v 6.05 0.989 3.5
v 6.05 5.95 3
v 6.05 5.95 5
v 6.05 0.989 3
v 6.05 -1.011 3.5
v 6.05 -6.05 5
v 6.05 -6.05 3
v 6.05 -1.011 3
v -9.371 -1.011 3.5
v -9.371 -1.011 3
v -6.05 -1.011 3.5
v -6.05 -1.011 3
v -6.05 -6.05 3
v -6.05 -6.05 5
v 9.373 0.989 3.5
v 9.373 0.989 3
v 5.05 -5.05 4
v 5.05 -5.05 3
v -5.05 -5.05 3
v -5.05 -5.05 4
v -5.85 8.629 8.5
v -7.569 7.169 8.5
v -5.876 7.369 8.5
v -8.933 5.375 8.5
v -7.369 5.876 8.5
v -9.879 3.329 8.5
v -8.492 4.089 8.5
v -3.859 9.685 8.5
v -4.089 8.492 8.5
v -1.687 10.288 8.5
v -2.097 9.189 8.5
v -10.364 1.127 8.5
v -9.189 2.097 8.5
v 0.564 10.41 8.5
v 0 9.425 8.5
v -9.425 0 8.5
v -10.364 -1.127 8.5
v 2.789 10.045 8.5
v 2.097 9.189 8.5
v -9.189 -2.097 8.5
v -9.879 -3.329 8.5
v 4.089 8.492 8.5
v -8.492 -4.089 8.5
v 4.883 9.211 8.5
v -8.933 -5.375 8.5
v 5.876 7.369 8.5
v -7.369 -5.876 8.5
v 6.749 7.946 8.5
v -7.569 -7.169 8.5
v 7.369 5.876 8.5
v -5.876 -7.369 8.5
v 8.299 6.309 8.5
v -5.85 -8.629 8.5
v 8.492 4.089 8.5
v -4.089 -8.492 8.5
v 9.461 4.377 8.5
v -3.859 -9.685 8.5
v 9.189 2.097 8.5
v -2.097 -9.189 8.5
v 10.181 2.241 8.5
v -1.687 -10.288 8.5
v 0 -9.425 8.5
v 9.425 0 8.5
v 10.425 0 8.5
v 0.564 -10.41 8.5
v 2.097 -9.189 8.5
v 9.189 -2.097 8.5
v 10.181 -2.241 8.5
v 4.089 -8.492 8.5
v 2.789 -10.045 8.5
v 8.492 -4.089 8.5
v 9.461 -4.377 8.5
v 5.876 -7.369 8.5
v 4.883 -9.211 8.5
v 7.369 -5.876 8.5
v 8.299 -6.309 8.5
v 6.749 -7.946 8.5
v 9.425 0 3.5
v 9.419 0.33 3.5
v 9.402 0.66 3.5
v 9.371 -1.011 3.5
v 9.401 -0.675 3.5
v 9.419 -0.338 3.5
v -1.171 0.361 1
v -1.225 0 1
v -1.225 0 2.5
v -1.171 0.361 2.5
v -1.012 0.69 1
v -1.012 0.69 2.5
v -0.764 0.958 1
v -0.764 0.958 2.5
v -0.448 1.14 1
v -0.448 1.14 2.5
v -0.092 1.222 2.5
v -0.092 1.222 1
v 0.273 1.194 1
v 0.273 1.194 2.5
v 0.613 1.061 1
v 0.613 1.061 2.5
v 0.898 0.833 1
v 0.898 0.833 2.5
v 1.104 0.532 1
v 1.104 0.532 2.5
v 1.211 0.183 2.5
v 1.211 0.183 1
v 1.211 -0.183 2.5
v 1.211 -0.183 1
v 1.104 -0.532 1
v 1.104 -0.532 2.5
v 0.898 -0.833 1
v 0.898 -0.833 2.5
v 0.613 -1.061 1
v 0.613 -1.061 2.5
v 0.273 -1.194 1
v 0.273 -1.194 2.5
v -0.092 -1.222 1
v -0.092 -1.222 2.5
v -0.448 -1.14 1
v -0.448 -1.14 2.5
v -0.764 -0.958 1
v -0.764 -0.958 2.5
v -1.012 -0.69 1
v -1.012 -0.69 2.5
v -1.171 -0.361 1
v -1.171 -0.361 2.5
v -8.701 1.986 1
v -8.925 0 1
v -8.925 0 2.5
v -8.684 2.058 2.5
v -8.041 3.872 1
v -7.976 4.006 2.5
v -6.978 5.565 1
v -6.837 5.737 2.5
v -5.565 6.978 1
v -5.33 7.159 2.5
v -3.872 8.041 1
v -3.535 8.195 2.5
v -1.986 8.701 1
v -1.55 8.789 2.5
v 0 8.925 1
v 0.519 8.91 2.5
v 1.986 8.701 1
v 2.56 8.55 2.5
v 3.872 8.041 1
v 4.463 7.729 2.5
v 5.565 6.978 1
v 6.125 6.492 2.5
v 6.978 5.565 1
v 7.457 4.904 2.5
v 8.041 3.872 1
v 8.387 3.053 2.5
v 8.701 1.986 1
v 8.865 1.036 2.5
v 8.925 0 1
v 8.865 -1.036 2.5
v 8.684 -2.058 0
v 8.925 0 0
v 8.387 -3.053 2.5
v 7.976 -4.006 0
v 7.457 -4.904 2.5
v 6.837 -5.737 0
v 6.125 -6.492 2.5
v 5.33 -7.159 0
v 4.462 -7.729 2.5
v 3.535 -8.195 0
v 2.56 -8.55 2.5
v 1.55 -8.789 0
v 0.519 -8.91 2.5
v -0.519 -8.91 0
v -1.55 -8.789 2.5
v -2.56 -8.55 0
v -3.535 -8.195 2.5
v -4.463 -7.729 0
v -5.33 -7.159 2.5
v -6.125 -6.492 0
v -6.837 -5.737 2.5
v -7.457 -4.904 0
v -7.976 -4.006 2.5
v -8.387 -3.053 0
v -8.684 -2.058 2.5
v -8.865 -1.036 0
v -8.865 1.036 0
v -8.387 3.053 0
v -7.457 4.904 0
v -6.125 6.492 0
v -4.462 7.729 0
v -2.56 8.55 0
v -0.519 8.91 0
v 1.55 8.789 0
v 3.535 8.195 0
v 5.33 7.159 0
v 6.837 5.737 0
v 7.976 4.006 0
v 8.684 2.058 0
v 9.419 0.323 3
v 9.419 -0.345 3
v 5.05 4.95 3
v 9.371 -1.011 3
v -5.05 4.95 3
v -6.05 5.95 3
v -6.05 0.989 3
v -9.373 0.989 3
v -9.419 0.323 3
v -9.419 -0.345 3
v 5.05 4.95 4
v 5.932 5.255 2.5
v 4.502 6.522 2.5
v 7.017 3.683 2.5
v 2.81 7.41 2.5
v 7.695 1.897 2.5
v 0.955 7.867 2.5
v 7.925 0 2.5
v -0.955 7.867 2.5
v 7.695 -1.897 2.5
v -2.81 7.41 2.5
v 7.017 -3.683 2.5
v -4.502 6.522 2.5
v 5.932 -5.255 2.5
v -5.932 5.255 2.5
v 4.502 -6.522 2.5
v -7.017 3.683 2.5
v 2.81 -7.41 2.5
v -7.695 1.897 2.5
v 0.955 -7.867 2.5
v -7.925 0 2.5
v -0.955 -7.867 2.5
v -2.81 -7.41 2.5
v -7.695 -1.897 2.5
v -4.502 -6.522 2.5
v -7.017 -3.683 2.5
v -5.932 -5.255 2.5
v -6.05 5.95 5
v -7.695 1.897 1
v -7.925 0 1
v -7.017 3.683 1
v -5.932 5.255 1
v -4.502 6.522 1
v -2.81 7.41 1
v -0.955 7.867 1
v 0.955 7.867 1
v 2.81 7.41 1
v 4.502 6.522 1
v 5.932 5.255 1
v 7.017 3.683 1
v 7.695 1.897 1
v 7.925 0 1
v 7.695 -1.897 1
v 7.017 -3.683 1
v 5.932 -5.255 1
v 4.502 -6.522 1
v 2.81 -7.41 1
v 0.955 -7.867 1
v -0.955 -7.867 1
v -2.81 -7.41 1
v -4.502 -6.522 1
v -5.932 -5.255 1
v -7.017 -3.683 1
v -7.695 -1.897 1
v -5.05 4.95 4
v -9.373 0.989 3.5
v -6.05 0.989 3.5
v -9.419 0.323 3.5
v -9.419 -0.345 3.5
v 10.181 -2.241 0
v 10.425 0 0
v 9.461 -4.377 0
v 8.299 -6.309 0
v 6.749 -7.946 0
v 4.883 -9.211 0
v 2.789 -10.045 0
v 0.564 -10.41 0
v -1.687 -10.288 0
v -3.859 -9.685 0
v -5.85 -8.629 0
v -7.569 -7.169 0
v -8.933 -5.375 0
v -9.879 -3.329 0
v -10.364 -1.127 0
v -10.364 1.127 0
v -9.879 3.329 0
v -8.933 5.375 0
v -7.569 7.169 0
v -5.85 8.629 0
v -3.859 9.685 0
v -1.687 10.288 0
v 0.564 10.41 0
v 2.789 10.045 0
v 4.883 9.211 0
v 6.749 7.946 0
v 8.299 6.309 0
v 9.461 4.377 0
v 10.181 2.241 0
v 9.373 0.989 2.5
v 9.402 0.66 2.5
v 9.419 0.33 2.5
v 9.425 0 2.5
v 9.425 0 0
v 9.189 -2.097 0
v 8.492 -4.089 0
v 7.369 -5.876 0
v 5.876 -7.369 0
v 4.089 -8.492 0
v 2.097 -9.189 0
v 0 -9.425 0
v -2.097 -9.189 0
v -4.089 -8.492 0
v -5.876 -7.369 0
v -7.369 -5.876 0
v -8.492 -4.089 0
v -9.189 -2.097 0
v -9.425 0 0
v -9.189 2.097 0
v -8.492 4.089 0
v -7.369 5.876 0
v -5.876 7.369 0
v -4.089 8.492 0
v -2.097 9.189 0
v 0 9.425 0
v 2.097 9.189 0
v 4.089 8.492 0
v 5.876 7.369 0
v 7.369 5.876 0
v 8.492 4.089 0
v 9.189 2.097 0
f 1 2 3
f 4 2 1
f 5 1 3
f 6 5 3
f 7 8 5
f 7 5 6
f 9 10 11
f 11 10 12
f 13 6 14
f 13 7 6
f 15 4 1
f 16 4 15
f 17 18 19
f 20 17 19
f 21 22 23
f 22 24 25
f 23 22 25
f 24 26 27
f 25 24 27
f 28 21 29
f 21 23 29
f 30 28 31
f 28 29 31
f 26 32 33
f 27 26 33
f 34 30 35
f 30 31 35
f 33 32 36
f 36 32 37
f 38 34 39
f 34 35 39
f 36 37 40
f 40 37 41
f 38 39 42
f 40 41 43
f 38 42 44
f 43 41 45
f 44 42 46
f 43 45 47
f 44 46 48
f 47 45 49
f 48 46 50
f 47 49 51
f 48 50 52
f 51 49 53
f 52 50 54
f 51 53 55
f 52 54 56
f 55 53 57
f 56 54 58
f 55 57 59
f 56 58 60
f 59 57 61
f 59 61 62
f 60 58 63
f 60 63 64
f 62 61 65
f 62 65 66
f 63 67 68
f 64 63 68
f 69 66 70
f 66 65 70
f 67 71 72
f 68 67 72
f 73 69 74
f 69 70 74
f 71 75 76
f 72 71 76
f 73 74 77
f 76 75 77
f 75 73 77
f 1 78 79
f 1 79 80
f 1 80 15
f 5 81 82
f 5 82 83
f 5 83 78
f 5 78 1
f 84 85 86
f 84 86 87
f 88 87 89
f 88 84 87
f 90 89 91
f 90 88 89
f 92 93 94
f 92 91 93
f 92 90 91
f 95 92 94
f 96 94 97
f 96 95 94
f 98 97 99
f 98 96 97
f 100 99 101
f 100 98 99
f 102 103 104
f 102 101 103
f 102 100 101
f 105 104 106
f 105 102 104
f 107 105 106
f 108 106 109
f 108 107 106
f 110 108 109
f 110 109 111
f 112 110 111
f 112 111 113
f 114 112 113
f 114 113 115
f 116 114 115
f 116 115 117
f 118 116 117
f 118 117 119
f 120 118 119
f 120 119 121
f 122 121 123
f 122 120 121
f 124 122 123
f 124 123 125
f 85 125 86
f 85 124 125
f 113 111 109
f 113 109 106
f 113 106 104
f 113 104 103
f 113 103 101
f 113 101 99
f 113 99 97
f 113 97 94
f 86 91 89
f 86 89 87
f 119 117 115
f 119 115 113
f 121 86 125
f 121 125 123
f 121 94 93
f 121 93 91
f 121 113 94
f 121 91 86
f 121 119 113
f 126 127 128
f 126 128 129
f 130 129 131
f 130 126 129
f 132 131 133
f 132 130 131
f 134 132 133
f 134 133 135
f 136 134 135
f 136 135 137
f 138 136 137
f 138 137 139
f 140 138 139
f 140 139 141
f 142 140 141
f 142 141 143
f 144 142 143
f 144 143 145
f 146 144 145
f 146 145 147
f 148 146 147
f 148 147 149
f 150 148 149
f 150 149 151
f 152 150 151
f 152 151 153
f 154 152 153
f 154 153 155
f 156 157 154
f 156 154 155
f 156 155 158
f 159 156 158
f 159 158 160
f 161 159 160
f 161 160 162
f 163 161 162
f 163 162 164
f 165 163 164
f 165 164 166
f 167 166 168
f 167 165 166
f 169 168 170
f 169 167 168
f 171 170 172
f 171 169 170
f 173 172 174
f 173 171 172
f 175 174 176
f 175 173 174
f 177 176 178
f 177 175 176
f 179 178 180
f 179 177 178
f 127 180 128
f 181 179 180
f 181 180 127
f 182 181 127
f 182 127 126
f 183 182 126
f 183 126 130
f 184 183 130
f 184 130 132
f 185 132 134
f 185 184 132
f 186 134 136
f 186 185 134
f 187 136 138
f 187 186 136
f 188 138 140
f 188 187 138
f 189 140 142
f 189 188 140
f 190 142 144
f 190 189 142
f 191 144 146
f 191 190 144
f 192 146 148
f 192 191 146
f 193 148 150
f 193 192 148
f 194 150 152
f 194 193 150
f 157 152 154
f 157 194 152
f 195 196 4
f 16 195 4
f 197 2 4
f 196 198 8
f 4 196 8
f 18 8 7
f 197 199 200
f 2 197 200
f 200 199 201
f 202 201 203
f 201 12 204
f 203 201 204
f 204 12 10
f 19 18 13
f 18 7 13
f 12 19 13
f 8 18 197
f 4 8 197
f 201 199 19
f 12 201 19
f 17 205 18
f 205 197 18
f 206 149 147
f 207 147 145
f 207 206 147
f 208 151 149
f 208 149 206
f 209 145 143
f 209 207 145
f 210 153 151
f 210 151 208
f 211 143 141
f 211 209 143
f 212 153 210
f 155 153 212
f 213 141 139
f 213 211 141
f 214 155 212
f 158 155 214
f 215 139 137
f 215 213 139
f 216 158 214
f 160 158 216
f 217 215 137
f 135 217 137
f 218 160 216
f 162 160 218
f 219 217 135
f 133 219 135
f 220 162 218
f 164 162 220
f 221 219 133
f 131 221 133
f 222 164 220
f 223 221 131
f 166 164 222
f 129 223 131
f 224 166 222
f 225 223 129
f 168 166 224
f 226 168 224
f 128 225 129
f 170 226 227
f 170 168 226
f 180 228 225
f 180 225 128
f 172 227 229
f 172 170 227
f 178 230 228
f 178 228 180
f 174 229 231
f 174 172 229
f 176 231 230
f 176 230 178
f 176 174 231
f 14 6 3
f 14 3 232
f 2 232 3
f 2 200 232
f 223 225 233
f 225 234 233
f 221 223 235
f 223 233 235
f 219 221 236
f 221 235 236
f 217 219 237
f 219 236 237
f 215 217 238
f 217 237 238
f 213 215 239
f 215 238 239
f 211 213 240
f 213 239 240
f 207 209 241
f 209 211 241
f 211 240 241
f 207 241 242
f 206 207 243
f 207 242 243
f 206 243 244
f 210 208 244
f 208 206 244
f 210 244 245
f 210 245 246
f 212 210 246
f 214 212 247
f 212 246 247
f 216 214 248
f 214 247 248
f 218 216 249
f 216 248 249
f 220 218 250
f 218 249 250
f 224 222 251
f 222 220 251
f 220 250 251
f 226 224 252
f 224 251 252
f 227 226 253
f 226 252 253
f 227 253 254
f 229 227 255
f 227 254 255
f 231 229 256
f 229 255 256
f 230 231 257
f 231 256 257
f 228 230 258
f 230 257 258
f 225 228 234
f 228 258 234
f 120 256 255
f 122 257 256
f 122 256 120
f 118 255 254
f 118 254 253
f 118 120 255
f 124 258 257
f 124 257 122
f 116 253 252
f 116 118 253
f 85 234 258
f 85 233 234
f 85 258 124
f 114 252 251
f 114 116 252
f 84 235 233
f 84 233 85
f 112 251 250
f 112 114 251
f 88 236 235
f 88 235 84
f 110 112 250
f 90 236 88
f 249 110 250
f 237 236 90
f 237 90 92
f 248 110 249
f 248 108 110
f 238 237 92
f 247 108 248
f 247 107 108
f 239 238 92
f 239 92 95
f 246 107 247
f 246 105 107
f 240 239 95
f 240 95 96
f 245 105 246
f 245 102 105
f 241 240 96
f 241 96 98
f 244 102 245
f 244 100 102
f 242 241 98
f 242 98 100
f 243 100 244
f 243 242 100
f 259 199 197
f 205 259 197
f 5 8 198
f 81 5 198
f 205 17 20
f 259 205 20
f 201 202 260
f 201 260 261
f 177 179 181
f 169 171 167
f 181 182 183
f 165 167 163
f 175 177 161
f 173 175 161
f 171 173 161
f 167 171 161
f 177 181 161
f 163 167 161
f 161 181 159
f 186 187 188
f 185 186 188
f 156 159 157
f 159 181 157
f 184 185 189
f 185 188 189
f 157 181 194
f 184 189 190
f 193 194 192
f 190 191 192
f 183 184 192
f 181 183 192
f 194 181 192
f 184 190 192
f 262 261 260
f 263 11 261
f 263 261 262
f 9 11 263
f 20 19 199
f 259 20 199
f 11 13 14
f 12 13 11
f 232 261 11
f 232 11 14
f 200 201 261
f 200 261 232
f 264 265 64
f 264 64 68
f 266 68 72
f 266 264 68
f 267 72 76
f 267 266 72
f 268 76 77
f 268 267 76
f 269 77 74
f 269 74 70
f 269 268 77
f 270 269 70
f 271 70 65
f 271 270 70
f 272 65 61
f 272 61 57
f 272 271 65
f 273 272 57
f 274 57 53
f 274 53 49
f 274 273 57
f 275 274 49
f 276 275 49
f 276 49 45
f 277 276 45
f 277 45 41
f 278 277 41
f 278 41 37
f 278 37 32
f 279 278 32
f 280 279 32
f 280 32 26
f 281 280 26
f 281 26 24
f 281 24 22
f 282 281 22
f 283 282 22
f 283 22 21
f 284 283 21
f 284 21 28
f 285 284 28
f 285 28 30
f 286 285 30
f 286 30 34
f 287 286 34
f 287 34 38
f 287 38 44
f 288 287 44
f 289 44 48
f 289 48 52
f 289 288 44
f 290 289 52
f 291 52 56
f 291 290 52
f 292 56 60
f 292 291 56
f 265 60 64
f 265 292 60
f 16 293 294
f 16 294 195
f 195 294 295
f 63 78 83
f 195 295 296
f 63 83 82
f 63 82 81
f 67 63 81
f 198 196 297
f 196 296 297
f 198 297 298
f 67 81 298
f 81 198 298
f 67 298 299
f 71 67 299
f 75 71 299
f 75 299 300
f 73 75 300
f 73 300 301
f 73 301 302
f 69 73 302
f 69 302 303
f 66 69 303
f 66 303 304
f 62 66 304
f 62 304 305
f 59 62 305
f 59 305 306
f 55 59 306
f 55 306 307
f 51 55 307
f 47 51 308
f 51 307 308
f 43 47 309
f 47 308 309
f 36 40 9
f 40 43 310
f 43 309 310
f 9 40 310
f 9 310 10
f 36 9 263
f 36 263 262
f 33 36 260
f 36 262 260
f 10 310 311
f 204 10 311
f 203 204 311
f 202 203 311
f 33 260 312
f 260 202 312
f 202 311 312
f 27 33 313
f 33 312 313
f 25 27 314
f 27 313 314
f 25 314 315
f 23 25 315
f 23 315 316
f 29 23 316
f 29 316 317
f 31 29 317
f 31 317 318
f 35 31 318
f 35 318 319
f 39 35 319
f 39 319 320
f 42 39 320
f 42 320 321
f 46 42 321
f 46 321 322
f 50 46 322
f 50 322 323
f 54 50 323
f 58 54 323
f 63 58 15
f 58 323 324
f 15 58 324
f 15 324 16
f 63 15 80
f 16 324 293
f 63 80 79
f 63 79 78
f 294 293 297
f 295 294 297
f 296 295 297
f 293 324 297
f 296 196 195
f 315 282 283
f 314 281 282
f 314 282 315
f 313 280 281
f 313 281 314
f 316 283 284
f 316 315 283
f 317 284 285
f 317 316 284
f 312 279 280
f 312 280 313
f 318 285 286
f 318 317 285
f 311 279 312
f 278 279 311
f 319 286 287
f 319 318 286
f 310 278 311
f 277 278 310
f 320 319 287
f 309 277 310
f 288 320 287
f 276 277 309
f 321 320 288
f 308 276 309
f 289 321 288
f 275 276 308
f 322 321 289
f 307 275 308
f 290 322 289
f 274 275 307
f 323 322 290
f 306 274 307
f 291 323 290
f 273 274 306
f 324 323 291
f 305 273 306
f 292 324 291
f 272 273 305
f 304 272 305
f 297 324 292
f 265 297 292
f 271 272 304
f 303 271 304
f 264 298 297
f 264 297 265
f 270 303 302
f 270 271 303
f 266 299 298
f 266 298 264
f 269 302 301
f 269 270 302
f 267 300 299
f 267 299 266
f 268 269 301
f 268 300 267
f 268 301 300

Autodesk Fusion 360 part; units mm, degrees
sketch "Sketch1" plane through (0, 0, 0) normal (0, 0, 1) x (1, 0, 0)
  circle A0 centre (0, 0) radius 7.925
  circle A1 centre (0, 0) radius 8.925
  dimension "d1" = 15.85
  dimension "d4" = 1
extrude "Extrude1" add sketch "Sketch1" along normal blind 1 contours A0 | A1 makes body 1
sketch "Sketch2" plane through (0, 0, 1) normal (0, 0, 1) x (-1, 0, 0)
  circle A0 centre (0, 0) radius 8.925
  circle A1 centre (0, 0) radius 7.925
  circle A2 centre (0, 0) radius 1.225
  dimension "d5" = 2.45
extrude "Extrude2" add sketch "Sketch2" along normal blind 1.5 bodies 1
sketch "Sketch1 (2)" plane through (0, 0, 0) normal (0, 0, -1) x (1, 0, 0) in component "Charger Bottom"
  circle A0 centre (0, 0) radius 8.925
  circle A1 centre (0, 0) radius 8.925
  circle A2 centre (0, 0) radius 9.425
  circle A3 centre (0, 0) radius 10.425
  dimension "d8" = 0.5
  dimension "d9" = 1.5
extrude "Extrude1'" add sketch "Sketch1 (2)" against normal blind 2.5 separate body contours A3 makes body 2 in component "Charger Bottom"
extrude "Extrude2'" add 1 faces at (10.0178, 0.9862, 2.5) along direction (0, 0, 1) blind 3 on bodies 2 bodies 2 in component "Charger Bottom"
sketch "Sketch2 (2)" plane through (0, 0, 2.5) normal (0, 0, 1) x (-1, 0, 0) in component "Charger Bottom"
  circle A0 centre (0, 0) radius 7.925
  circle A1 centre (0, 0) radius 8.925
  circle A2 centre (0, 0) radius 9.425
  circle A3 centre (0, 0) radius 10.425
  line L0 (10.425, 0.0113) -> (-10.425, 0.0113)
  line L1 (10.425, 1.0113) -> (-10.425, 1.0113)
  line L2 (10.425, -0.9887) -> (-10.425, -0.9887)
  dimension "d14" = 1
  dimension "d15" = -1
extrude "Extrude3" add sketch "Sketch2 (2)" along normal blind 1 contours A0 L0 L2 | A0 A1 L0 L2 | A0 L0 L1 | A0 A1 L0 L1 | A1 A2 L0 L2 | A1 A2 L0 L1 | A0 A1 L0 L1 | A0 A1 L0 L2 | A1 A2 L0 L1 | A1 A2 L0 L2 bodies 2 in component "Charger Bottom"
extrude "Extrude4" cut 1 faces at (3.1235, 0.322, 2.5) along direction (0, 0, 1) blind 0.5 on bodies 2 bodies 2 in component "Charger Bottom"
sketch "Sketch3" plane through (0, 0, 3) normal (0, 0, -1) x (1, 0, 0) in component "Charger Bottom"
  arc A0 (-9.3706, 1.0113) -> (-9.373, -0.9887) centre (0, 0) ccw
  line L0 (-9.373, -0.9887) -> (9.373, -0.9887)
  arc A1 (9.373, -0.9887) -> (9.3706, 1.0113) centre (0, 0) ccw
  line L1 (9.3706, 1.0113) -> (-9.3706, 1.0113)
  line L2 (0, 0) -> (0, 5.05) construction
  line L3 (0, 5.05) -> (-5.05, 5.05) construction
  line L4 (-5.05, 5.05) -> (-5.05, -4.95)
  line L5 (-5.05, -4.95) -> (5.05, -4.95)
  line L6 (5.05, -4.95) -> (5.05, 5.05)
  line L7 (5.05, 5.05) -> (-5.05, 5.05)
  line L8 (6.05, 6.05) -> (-6.05, 6.05)
  line L9 (-6.05, 6.05) -> (-6.05, -5.95)
  line L10 (-6.05, -5.95) -> (6.05, -5.95)
  line L11 (6.05, -5.95) -> (6.05, 6.05)
  dimension "d20" = 5.05
  dimension "d21" = 5.05
  dimension "d22" = 10
  dimension "d23" = 10.1
  dimension "d24" = 1
extrude "Extrude6" add sketch "Sketch3" against normal blind 1 contours L1 L4 L6 L7 L8 L9 L11 | L0 L1 L4 L9 | L0 L4 L5 L6 L9 L10 L11 | L0 L1 L6 L11 bodies 2 in component "Charger Bottom"
extrude "Extrude5" cut sketch "Sketch3" against normal blind 0.5 contours L1 L4 L6 L7 | L0 L1 L4 L6 | L0 L4 L5 L6 bodies 2 in component "Charger Bottom"
sketch "Sketch4" plane through (0, 0, 4) normal (0, 0, 1) x (-1, 0, 0) in component "Charger Bottom"
  line L0 (-5.05, 5.05) -> (5.05, 5.05)
  line L1 (5.05, 5.05) -> (5.05, -4.95)
  line L2 (5.05, -4.95) -> (-5.05, -4.95)
  line L3 (-5.05, -4.95) -> (-5.05, 5.05)
  line L4 (-6.05, 6.05) -> (-6.05, -5.95)
  line L5 (-6.05, -5.95) -> (6.05, -5.95)
  line L6 (6.05, -5.95) -> (6.05, 6.05)
  line L7 (6.05, 6.05) -> (-6.05, 6.05)
  line L8 (5.05, -4.95) -> (-5.05, -4.95)
  line L9 (5.05, 5.05) -> (5.05, -4.95)
  line L10 (-5.05, 5.05) -> (5.05, 5.05)
  line L11 (-5.05, -4.95) -> (-5.05, 5.05)
extrude "Extrude7" add sketch "Sketch4" along normal blind 1 contours L0 L1 L2 L3 L8 L9 L10 L11 | L4 L5 L6 L7 bodies 2 in component "Charger Bottom"
extrude "Extrude8" add 1 faces at (10.0178, 0.9862, 5.5) along direction (0, 0, 1) blind 3 on bodies 2 bodies 2 in component "Charger Bottom"
sketch "Sketch5" plane through (0, 0, 8.5) normal (0, 0, 1) x (-1, 0, 0) in component "Charger Bottom"
  circle A0 centre (0, 0) radius 9.425
  circle A1 centre (0, 0) radius 10.425
  circle A2 centre (0, 0) radius 9.425
component "Charger Bottom" placed x (1, 0, 0) y (0, 1, 0) z (0, 0, 1) at (0, 0, 0)
equation "d1 = ( 31.7 / 2 ) * 1 mm"
equation "d5 = ( 4.9 / 2 ) * 1 mm"
